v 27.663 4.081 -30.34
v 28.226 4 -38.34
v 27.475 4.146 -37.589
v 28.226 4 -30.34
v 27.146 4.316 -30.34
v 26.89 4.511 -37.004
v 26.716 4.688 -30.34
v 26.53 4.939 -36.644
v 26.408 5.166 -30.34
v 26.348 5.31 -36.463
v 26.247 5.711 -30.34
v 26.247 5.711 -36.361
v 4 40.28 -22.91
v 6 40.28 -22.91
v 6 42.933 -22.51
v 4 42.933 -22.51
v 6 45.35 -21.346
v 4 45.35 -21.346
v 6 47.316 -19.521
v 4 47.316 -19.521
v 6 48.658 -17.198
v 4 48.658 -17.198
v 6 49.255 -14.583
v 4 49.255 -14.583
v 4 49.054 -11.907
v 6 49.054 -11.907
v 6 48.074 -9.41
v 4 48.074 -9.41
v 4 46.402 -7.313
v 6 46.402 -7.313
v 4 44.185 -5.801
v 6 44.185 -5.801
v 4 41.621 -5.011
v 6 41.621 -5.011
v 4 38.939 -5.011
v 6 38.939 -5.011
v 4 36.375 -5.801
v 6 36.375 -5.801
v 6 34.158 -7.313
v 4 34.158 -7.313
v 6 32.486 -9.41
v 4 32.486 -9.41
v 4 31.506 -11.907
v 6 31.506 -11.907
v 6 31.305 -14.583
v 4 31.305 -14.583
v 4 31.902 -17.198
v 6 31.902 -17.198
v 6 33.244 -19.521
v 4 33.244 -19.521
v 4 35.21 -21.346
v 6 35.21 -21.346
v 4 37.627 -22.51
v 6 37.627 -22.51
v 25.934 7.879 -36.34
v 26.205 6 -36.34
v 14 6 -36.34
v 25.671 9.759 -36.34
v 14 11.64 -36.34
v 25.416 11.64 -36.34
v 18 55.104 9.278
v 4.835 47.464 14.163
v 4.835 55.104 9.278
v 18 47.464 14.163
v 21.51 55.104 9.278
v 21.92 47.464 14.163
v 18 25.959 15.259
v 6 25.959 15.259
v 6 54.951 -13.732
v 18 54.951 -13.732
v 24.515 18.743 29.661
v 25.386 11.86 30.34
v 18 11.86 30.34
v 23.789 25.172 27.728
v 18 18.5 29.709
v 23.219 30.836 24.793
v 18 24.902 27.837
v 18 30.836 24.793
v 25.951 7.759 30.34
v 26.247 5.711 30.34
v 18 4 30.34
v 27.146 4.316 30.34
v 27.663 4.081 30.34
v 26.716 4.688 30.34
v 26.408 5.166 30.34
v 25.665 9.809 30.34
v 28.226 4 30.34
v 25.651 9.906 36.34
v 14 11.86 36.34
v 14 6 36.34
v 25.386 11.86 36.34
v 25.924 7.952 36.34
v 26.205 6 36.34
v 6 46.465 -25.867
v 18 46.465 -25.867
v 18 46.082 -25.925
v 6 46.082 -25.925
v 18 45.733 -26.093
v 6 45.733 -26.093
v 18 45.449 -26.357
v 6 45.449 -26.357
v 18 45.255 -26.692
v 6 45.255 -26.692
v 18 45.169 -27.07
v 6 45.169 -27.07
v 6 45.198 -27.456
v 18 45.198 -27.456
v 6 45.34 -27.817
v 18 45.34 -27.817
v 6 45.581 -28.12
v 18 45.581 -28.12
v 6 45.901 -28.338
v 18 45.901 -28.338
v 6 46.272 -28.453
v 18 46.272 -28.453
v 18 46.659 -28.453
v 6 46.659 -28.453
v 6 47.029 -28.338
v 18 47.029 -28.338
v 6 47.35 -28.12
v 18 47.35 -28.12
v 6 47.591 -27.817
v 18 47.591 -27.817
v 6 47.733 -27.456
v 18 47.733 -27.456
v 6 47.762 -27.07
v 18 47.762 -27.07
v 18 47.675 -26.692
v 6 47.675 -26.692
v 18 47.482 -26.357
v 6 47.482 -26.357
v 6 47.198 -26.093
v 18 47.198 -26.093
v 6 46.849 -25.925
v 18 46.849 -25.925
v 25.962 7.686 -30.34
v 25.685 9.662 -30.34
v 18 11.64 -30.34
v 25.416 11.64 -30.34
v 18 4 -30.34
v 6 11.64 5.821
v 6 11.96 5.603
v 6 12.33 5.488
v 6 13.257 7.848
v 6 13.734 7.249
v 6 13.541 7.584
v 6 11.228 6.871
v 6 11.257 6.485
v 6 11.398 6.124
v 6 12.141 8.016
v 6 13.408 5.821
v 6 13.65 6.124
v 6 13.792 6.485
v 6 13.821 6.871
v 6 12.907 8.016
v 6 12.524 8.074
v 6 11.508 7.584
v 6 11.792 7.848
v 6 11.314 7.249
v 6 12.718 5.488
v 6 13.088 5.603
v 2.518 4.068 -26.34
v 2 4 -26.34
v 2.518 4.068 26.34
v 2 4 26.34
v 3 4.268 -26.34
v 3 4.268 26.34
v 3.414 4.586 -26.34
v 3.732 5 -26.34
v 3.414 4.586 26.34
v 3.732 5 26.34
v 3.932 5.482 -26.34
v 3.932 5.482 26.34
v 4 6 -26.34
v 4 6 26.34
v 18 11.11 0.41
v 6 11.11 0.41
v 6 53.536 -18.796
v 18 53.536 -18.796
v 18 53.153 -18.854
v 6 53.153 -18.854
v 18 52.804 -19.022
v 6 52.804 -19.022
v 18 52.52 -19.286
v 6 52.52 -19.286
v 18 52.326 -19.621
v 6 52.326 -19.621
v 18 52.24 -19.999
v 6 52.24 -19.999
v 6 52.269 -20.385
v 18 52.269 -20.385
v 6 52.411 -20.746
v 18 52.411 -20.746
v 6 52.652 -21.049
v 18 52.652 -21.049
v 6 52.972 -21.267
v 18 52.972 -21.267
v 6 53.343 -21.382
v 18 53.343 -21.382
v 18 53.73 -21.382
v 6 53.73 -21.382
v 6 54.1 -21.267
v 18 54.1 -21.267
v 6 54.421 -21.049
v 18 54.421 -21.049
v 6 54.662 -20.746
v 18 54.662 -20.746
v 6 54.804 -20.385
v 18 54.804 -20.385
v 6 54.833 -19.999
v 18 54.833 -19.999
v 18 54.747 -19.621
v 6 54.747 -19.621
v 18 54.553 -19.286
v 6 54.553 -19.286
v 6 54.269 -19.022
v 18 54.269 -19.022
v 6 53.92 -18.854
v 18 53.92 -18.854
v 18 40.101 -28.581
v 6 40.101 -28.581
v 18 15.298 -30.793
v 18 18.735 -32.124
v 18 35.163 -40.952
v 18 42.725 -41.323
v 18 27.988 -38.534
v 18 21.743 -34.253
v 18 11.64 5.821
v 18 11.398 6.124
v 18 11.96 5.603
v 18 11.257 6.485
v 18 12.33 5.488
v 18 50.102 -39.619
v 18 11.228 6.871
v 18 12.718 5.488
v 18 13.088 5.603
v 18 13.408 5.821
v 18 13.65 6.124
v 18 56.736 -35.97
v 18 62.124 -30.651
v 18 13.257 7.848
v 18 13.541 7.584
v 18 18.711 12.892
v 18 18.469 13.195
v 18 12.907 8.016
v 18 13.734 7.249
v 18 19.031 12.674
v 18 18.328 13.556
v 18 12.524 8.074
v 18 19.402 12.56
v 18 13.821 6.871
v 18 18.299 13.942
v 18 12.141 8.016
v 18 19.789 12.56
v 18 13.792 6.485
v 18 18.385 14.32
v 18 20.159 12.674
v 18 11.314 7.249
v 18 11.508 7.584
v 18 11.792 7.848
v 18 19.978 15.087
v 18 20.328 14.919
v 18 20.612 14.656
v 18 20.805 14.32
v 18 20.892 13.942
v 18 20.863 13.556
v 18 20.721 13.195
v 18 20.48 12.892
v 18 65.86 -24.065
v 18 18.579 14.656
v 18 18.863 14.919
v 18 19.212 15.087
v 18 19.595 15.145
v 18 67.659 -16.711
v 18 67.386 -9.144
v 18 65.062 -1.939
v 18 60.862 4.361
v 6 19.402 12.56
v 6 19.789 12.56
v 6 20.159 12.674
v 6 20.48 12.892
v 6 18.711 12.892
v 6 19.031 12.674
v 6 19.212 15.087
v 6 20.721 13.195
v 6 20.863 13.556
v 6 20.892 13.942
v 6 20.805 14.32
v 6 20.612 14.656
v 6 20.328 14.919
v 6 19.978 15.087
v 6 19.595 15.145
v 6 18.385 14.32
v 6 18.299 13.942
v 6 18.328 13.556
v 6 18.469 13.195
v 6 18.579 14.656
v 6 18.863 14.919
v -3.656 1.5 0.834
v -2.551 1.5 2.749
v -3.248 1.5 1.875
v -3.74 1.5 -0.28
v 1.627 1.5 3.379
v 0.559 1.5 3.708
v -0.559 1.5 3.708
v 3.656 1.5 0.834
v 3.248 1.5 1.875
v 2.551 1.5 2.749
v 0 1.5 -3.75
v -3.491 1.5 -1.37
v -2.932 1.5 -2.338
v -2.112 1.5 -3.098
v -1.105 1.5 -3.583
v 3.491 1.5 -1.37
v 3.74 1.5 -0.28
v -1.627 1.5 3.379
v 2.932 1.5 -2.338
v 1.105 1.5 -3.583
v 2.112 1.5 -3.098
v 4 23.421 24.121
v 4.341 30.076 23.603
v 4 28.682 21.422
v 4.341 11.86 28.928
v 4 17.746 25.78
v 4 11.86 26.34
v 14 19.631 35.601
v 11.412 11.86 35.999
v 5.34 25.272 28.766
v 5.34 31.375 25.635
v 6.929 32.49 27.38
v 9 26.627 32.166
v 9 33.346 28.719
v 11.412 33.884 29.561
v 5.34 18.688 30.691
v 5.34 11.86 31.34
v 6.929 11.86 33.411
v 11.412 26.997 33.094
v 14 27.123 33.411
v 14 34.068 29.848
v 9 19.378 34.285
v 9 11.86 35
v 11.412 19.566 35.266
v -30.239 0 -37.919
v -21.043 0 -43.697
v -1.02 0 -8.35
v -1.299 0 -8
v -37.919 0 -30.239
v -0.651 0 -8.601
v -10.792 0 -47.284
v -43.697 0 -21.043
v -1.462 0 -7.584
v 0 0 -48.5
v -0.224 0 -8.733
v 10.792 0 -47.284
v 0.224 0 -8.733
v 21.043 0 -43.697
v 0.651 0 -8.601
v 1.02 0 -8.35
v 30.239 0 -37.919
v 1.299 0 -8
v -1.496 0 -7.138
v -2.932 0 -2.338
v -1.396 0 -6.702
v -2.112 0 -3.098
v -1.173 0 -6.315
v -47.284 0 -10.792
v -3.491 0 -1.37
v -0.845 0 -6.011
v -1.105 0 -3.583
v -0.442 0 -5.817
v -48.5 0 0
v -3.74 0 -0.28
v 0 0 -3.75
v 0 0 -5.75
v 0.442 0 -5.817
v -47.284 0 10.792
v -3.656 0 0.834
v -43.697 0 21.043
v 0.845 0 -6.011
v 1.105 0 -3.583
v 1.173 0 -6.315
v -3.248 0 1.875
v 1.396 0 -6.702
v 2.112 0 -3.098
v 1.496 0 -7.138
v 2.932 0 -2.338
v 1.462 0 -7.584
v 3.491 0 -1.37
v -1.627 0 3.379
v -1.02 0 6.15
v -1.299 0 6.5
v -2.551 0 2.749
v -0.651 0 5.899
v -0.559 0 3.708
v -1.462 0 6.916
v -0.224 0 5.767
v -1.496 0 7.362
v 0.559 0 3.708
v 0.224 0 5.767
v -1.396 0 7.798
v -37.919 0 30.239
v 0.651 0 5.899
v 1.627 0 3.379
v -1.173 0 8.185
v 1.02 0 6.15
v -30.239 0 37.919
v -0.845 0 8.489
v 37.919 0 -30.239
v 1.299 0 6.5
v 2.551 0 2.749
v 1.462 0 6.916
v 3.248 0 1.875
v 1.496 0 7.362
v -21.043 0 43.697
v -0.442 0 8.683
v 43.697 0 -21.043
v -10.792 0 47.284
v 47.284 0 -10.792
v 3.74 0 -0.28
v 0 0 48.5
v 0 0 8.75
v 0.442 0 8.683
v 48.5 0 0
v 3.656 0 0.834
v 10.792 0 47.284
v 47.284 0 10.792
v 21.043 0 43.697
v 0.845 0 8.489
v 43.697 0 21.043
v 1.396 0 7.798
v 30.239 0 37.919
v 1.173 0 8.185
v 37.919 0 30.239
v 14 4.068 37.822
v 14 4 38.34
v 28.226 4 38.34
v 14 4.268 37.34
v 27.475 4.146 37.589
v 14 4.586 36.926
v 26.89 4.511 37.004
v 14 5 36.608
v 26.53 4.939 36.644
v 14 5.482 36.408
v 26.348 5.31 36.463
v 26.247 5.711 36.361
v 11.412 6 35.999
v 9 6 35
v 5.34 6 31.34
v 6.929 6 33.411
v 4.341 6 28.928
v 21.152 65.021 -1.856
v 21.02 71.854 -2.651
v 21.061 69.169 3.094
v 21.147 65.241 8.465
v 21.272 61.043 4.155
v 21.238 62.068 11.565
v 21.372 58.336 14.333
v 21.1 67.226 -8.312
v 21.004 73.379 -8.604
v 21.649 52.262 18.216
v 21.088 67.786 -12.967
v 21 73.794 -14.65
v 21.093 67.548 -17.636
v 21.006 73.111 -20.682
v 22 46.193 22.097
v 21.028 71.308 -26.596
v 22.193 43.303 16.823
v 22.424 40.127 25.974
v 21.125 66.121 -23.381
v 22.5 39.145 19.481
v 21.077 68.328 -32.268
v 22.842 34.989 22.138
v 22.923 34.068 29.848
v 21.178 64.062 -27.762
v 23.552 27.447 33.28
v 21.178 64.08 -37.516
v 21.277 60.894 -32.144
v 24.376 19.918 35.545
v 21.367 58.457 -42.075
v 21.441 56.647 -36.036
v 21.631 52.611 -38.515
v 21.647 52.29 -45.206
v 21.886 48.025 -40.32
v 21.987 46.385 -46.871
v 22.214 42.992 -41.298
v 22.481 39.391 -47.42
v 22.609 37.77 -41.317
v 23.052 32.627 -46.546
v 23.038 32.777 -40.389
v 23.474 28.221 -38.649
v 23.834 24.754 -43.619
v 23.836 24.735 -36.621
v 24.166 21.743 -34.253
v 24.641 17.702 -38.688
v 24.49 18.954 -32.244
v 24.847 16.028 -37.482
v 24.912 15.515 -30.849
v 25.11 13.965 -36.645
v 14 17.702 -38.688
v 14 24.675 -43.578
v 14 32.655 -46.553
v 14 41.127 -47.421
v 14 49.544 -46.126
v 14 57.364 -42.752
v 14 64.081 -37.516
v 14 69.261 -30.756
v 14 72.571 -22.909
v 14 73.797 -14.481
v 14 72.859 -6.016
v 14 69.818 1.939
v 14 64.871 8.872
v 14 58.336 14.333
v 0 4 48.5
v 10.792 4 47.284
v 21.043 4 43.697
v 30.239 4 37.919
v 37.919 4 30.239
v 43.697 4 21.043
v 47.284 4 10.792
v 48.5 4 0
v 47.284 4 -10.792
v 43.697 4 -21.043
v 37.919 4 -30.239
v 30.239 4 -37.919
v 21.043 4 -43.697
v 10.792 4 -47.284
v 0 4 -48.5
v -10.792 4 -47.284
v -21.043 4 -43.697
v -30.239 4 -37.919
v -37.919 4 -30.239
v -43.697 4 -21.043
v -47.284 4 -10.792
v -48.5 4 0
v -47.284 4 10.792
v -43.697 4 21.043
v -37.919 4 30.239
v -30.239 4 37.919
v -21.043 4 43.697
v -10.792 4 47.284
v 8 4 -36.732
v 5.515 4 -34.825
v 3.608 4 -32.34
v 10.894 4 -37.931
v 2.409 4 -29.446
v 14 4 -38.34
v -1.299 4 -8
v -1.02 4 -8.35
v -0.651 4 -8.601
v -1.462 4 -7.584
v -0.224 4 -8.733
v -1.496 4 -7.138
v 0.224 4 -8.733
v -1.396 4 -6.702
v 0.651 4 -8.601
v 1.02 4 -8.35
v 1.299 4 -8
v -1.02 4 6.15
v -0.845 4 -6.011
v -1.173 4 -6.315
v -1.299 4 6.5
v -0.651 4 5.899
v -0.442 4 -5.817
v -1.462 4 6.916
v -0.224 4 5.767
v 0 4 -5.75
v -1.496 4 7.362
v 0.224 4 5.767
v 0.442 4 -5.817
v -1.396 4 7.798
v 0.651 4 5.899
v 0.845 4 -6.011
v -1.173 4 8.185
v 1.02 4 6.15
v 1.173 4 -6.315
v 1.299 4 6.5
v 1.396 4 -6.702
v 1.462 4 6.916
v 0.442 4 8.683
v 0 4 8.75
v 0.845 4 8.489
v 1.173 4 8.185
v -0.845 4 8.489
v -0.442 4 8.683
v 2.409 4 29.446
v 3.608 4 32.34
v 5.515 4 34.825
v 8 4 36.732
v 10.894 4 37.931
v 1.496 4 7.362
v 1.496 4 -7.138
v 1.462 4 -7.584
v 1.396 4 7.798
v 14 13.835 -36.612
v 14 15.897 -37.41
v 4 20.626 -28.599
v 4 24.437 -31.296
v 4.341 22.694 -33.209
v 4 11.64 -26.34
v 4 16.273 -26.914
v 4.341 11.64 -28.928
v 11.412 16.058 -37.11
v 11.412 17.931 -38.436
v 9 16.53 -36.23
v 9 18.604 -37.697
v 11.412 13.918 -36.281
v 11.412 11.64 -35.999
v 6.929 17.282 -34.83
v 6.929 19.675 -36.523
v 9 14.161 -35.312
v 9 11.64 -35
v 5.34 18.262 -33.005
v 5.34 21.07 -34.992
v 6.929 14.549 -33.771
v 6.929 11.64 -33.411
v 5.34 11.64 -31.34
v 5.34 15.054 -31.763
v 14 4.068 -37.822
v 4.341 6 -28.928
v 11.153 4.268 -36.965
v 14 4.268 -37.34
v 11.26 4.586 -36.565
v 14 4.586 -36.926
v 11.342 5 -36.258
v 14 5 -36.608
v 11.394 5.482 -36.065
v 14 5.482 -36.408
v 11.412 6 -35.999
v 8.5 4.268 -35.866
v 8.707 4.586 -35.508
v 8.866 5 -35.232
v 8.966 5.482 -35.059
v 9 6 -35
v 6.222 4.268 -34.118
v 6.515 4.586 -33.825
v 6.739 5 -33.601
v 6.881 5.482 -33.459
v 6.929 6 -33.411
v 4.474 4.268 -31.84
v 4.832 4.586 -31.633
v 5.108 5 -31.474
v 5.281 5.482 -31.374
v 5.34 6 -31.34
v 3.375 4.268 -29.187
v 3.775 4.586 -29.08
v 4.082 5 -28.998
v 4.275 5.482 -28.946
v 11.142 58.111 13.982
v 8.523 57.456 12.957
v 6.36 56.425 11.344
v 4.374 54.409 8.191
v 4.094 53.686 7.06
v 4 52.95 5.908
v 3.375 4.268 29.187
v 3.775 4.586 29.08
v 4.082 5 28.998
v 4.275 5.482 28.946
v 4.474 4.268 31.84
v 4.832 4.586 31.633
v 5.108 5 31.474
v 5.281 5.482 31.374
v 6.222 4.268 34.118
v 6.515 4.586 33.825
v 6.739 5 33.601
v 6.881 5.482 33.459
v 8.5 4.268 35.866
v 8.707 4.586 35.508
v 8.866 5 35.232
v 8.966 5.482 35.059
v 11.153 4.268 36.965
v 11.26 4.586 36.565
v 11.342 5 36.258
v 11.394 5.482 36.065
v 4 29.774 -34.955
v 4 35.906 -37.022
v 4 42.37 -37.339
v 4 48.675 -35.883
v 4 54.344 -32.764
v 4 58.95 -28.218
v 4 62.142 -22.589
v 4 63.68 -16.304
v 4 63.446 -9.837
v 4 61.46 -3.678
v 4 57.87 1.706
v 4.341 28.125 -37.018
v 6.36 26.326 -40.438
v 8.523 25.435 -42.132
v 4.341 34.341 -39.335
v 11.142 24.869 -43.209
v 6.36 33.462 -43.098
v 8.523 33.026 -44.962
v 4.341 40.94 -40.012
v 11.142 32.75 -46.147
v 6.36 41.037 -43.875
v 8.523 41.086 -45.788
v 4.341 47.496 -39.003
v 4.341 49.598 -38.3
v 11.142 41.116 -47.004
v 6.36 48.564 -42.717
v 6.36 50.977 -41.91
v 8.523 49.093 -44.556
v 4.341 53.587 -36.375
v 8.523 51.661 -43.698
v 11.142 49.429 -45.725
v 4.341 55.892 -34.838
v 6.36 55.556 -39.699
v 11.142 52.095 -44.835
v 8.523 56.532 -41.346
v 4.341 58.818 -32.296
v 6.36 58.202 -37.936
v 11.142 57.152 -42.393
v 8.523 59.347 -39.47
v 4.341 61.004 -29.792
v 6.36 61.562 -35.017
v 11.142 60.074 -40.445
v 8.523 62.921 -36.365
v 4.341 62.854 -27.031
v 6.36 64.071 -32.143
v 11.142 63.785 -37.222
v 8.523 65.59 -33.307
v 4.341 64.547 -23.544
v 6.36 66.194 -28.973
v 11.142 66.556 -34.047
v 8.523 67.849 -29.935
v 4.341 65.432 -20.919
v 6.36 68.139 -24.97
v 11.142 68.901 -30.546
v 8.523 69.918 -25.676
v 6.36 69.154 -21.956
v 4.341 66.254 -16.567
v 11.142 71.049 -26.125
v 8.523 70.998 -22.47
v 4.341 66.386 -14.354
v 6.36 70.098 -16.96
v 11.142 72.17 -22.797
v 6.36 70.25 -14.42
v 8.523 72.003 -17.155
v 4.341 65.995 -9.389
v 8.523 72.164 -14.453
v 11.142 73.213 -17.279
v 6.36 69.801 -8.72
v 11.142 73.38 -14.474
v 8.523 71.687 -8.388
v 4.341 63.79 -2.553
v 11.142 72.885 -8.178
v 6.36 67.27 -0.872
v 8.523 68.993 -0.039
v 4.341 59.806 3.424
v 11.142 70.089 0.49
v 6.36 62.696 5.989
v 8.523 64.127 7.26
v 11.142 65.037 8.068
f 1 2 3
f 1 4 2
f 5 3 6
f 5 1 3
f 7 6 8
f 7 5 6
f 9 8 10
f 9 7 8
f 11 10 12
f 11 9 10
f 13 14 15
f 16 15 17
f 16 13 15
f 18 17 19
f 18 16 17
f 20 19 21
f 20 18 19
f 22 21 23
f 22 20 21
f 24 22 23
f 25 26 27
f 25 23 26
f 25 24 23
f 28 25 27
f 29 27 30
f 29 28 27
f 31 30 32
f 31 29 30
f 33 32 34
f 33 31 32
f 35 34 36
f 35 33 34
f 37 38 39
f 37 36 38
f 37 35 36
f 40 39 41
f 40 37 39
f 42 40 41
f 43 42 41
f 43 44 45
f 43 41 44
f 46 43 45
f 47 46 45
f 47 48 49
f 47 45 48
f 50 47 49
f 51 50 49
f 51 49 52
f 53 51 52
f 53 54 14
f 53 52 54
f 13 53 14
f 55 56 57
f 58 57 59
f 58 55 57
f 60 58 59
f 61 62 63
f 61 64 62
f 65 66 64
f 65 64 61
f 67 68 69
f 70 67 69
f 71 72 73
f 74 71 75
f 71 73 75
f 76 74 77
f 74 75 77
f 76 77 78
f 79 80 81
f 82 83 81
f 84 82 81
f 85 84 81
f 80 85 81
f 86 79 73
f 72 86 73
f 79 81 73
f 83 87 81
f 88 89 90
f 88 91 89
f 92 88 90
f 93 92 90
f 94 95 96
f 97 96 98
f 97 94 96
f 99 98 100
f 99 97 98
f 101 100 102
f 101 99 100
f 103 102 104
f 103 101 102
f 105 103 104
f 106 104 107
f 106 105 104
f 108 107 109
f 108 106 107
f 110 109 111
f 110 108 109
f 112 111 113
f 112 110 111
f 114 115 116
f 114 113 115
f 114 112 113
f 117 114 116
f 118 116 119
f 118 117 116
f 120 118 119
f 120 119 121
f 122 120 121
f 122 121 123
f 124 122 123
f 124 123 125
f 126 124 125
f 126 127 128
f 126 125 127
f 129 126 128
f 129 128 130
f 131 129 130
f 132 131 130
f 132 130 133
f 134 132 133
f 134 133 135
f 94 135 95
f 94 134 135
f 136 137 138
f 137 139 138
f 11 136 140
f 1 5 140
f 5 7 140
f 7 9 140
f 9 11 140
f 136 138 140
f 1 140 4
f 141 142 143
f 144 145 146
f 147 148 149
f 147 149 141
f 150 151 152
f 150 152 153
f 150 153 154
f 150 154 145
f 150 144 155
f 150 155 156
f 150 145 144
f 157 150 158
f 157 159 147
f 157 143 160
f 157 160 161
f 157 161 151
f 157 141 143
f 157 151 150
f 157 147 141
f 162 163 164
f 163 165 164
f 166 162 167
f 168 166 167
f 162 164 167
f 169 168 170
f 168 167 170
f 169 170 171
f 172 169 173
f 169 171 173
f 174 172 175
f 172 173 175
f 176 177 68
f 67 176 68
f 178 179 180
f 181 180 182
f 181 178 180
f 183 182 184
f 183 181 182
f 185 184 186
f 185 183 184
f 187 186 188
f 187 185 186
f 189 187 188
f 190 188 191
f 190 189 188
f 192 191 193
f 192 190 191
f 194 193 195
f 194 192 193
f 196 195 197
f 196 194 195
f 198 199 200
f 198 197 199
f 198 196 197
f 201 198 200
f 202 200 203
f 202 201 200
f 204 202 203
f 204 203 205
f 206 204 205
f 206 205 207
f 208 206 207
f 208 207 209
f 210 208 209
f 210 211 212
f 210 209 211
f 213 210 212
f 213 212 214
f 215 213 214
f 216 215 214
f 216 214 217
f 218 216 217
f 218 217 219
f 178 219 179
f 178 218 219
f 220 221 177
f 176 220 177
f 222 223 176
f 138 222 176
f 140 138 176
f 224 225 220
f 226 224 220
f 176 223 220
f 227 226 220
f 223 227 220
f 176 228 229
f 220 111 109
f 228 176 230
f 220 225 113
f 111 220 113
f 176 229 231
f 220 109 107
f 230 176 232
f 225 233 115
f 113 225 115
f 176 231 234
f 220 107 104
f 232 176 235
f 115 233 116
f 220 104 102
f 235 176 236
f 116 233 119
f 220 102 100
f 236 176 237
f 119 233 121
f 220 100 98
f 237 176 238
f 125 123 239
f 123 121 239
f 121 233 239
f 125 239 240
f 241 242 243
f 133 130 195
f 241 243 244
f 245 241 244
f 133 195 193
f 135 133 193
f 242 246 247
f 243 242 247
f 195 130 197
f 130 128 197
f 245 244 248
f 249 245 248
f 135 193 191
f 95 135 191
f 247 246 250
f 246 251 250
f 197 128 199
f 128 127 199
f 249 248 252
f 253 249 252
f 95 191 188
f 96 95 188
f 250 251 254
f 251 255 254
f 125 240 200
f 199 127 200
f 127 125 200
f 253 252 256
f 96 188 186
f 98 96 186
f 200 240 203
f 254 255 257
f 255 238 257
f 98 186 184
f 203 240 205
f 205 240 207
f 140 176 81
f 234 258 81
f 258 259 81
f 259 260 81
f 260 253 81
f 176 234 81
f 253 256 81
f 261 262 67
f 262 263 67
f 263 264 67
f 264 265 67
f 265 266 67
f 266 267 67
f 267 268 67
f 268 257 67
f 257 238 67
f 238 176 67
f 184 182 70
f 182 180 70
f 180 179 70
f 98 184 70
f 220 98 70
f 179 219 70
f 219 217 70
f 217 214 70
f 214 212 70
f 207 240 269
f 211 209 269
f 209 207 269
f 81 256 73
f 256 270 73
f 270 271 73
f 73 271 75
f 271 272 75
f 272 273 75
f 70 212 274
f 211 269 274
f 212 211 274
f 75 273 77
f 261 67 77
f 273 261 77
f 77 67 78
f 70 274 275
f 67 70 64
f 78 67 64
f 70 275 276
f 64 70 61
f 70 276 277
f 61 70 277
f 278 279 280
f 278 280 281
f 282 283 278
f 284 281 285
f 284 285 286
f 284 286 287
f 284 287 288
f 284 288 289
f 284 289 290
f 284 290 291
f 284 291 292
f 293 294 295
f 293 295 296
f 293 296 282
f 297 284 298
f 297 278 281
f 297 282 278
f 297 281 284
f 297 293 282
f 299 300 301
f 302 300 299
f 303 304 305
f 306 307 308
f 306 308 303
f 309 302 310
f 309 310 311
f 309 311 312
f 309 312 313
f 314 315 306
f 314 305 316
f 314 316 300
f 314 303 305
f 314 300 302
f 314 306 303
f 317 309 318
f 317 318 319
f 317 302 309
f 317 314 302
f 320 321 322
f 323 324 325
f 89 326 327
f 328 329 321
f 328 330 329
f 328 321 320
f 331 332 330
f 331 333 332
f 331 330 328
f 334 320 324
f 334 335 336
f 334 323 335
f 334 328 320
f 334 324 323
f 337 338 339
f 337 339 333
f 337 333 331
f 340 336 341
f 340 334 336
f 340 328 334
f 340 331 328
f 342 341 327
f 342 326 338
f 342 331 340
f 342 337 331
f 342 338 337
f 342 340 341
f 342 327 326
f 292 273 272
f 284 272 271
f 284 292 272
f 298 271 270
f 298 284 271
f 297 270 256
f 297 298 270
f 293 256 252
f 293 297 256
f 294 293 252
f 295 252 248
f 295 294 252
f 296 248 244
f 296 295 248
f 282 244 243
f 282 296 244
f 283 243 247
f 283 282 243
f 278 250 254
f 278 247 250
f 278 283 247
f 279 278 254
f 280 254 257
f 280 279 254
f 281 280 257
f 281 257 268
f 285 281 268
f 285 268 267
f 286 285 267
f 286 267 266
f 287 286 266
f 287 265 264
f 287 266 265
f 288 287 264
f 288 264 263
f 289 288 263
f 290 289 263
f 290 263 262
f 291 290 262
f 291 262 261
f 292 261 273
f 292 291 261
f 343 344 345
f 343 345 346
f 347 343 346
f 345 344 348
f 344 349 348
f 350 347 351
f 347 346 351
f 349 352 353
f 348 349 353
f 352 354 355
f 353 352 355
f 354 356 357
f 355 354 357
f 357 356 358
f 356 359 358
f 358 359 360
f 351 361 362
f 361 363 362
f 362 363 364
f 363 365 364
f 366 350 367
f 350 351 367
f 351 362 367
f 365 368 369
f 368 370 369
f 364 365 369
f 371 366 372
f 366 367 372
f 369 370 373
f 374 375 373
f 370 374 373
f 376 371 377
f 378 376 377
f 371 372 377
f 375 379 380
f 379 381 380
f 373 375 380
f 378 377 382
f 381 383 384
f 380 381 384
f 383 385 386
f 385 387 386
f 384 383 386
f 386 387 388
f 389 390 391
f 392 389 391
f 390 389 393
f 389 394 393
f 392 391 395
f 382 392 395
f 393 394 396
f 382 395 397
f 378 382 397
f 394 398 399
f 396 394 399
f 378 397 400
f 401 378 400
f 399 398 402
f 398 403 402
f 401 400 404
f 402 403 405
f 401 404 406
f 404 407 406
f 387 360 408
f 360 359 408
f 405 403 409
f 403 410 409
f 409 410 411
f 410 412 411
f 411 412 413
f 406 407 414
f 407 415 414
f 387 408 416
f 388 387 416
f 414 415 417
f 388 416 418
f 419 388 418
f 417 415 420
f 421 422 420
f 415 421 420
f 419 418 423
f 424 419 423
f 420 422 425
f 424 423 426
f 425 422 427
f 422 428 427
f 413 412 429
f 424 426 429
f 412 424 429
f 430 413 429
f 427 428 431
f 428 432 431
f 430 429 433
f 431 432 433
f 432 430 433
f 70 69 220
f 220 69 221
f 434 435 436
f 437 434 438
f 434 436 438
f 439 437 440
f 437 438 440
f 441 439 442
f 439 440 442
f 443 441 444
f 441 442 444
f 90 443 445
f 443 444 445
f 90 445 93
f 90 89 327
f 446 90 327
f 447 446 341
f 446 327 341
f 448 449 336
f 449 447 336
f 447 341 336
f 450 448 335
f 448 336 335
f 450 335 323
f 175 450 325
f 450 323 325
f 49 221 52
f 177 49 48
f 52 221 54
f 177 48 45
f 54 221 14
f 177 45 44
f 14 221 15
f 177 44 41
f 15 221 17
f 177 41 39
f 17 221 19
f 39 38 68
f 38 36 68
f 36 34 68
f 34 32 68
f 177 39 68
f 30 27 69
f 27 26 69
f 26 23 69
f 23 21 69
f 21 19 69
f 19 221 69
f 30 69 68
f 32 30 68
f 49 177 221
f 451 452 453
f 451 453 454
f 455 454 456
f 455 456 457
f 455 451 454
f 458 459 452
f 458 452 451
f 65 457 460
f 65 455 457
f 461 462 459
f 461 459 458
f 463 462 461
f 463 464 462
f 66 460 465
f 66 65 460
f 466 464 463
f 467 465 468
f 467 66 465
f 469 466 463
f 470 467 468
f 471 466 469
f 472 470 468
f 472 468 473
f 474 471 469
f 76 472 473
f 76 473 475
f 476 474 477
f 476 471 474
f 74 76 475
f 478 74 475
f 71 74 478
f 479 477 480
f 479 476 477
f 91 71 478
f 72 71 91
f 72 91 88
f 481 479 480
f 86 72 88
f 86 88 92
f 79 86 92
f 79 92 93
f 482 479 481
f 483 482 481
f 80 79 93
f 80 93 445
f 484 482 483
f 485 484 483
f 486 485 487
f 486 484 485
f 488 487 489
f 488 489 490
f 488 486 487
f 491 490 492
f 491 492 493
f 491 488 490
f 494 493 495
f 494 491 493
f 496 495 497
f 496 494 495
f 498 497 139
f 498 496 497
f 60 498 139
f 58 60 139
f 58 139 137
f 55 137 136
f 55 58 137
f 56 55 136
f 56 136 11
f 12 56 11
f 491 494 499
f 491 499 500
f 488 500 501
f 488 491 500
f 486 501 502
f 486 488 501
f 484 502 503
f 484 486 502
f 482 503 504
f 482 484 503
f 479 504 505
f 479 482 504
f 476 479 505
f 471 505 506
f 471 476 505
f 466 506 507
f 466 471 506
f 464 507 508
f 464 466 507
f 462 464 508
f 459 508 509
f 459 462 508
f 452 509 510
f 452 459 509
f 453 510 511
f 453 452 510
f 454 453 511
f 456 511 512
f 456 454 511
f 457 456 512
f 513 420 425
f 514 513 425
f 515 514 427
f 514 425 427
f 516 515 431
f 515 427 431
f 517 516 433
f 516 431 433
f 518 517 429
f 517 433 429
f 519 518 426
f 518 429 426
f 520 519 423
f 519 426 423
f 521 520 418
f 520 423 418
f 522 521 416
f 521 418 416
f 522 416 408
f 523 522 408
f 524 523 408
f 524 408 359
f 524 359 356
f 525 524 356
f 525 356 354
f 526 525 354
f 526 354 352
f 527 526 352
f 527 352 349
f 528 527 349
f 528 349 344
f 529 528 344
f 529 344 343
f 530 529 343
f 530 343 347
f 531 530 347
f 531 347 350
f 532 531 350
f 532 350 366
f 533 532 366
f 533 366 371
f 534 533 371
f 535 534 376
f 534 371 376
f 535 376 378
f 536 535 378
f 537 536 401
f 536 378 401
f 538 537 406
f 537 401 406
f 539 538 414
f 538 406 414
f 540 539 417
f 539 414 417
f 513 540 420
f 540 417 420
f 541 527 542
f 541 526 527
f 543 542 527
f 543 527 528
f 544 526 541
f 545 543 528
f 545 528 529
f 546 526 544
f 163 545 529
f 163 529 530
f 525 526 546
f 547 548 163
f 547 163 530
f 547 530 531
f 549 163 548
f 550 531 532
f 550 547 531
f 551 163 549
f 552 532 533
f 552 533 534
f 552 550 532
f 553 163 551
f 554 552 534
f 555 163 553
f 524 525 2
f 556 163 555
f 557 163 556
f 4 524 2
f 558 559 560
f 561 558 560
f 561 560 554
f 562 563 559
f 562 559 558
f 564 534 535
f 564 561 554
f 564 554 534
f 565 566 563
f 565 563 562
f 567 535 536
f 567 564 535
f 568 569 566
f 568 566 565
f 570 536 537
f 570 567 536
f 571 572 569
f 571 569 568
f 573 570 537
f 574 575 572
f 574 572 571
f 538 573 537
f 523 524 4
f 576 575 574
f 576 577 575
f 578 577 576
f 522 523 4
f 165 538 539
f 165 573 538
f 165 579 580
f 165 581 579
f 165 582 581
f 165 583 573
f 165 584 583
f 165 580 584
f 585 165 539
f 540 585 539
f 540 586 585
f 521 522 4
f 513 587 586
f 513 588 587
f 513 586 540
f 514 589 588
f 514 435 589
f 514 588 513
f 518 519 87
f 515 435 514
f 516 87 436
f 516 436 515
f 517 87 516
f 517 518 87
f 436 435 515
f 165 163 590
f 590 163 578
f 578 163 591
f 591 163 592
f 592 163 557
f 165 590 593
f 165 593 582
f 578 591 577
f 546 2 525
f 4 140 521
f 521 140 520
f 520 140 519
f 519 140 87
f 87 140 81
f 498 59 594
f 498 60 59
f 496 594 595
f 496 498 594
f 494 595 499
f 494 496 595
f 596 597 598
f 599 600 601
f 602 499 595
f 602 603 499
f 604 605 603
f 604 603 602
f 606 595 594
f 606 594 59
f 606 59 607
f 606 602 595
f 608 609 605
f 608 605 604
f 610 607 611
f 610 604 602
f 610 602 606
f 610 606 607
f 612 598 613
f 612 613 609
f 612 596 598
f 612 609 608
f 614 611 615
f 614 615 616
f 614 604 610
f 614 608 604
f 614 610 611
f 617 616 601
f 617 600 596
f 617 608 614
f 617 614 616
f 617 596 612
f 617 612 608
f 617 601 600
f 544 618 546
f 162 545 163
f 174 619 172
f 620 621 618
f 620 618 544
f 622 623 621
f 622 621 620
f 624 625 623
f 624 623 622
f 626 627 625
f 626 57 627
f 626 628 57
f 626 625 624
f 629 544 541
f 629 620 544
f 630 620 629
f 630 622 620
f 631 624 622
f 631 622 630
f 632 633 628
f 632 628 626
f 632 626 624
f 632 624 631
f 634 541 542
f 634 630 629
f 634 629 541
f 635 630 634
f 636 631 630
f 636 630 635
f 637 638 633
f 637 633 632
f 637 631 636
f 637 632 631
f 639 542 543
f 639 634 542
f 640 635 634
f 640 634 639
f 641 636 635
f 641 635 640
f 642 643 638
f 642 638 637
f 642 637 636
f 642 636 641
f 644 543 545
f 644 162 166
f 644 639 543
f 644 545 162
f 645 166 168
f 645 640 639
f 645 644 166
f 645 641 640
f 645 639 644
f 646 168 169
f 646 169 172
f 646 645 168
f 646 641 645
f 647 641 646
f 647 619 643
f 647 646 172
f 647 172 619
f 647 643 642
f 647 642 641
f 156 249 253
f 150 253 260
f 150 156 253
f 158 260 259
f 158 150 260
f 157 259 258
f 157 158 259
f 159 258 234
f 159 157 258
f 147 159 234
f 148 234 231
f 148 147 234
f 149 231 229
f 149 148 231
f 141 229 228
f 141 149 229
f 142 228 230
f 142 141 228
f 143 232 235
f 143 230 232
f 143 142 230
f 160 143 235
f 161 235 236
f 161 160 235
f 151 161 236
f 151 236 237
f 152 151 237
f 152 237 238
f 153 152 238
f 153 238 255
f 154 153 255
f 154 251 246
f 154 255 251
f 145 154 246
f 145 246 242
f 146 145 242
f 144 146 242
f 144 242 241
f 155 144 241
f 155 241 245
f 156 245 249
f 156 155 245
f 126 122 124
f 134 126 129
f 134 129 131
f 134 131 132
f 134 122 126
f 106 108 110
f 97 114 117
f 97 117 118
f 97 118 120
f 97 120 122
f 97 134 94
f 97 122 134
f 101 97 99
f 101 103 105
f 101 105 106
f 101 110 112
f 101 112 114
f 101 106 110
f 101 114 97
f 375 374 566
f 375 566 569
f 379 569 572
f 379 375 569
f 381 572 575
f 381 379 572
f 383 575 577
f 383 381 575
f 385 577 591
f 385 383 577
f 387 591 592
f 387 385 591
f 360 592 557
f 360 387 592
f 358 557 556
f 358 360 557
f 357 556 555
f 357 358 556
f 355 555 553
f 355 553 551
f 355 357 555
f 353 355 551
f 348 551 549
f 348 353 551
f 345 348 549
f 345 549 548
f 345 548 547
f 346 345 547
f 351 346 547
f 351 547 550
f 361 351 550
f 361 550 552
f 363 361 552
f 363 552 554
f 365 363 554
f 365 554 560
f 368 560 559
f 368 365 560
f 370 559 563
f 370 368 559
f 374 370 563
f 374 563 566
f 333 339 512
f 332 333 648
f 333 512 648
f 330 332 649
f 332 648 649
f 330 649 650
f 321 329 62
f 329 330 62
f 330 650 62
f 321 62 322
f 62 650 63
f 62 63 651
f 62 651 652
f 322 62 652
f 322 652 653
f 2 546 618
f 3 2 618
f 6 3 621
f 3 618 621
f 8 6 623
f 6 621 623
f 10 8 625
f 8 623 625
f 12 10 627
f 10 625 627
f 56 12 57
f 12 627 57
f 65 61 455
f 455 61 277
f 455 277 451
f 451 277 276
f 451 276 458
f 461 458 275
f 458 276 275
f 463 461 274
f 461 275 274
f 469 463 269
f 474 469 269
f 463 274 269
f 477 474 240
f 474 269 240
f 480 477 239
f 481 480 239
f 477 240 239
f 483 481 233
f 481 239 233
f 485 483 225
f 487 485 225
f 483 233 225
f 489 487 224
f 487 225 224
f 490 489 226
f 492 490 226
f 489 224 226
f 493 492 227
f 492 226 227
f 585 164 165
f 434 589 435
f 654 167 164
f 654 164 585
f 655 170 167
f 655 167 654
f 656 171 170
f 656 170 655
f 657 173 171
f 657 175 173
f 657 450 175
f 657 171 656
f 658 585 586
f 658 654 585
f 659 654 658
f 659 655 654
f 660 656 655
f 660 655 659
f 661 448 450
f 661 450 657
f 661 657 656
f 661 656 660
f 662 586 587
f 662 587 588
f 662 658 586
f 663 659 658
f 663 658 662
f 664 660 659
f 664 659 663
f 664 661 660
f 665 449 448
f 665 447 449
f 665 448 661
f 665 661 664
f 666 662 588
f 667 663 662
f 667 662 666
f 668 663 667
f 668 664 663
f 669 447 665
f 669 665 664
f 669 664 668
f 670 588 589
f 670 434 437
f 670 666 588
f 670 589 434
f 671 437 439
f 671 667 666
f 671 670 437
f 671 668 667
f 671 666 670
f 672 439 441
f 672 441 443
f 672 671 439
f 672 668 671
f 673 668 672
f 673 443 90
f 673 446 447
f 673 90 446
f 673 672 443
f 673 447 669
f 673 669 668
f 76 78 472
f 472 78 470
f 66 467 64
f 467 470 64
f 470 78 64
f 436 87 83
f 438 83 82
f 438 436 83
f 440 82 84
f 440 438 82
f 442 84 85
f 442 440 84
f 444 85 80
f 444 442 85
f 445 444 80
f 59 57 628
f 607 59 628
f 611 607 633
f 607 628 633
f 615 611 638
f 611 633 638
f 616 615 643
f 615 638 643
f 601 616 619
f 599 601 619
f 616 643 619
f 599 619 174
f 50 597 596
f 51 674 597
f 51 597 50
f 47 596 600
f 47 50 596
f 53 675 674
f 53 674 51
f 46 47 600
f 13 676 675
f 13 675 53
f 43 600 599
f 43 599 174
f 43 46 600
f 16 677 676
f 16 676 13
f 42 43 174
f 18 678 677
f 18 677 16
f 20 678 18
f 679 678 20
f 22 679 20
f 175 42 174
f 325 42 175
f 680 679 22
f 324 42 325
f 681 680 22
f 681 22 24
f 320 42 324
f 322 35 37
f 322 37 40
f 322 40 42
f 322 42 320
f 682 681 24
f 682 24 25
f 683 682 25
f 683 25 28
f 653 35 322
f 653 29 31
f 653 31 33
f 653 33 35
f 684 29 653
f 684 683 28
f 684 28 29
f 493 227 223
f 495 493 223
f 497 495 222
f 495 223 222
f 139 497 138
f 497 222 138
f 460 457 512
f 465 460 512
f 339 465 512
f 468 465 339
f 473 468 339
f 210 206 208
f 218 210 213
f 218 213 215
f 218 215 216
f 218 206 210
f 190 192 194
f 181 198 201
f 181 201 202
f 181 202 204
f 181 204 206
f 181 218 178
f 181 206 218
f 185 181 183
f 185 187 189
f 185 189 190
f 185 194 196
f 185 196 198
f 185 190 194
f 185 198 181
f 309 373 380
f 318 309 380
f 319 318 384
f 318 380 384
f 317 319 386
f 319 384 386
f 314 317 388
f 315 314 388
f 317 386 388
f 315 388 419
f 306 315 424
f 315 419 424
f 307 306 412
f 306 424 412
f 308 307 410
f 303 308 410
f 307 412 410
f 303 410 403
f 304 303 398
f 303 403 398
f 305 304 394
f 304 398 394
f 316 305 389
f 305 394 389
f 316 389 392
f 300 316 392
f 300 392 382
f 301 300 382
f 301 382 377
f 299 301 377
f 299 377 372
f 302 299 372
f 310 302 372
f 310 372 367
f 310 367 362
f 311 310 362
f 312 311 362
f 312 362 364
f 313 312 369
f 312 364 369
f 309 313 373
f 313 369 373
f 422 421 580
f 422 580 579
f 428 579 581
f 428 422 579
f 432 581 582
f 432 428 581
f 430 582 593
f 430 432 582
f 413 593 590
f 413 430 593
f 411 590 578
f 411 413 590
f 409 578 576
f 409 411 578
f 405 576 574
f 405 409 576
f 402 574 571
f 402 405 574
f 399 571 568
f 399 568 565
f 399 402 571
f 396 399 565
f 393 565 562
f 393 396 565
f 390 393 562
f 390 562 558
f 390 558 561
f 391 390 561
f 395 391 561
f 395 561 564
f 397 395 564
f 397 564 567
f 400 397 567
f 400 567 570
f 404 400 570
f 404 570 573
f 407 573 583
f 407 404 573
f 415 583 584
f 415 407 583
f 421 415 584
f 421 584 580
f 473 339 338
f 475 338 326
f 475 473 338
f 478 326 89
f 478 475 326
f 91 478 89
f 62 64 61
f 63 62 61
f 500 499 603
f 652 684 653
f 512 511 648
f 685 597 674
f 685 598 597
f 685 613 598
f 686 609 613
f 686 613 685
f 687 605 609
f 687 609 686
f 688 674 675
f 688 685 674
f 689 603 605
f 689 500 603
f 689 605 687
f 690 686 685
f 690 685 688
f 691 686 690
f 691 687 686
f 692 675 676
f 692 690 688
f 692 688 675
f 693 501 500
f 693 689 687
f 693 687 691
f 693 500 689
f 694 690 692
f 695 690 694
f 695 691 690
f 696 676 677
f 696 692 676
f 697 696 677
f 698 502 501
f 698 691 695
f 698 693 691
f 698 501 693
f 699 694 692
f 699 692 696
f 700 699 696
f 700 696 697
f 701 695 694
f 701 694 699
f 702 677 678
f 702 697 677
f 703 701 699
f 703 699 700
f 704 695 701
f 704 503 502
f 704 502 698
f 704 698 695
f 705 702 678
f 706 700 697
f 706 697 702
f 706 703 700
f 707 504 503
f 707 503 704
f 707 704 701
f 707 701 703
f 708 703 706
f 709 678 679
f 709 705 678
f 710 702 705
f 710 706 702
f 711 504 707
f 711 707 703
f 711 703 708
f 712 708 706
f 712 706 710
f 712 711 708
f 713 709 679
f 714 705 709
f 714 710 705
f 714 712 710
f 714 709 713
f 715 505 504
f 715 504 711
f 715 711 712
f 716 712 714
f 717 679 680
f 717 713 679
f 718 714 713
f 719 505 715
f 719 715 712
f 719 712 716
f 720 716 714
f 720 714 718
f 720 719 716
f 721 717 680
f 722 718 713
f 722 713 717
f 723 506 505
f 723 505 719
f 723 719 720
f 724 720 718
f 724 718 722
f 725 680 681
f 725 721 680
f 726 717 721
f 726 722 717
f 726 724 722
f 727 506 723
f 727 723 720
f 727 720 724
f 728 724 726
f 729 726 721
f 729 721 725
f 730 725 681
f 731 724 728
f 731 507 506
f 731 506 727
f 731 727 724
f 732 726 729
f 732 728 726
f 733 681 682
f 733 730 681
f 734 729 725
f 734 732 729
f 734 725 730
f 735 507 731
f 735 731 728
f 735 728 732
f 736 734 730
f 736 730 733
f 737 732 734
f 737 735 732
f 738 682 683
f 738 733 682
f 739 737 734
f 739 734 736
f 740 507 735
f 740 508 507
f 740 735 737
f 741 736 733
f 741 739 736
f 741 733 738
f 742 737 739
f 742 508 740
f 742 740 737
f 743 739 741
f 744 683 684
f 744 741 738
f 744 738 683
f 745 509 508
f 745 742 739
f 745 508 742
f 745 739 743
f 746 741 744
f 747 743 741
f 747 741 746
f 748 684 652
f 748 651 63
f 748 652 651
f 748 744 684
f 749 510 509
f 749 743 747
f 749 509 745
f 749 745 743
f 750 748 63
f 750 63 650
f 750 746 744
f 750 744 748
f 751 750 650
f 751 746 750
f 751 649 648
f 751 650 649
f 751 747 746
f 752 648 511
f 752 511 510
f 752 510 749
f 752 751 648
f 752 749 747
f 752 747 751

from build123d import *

# Parameters (mm, degrees)
SKETCH1_R                       = 48.5
SKETCH1_R_2                     = 1.5
BOSS_EXTRUDE1_DEPTH             = 4
SKETCH2_R                       = 3.75
CUT_EXTRUDE1_DEPTH              = 1.5
BOSS_EXTRUDE2_START             = 4
SKETCH3_R                       = 9
BOSS_EXTRUDE2_DEPTH             = 14
CUT_EXTRUDE3_START              = 6
SKETCH4_R                       = 1.3
CUT_EXTRUDE3_DEPTH              = 91.444646155
BOSS_EXTRUDE3_DEPTH             = 9
BOSS_EXTRUDE3_DIRECTION_2_REACH = 108.638
CUT_EXTRUDE4_DEPTH              = 101.75311462
CUT_EXTRUDE4_DEPTH_BACK         = 101.75311462
FILLET1_R                       = 10
FILLET2_R                       = 2


with BuildPart() as part:
    # Sketch1 → Boss-Extrude1 (new body)
    with BuildSketch(Plane(origin=(0, 0, 0), x_dir=(1, 0, 0), z_dir=(0, 1, 0))):
        with Locations(Location((0, 0, 0), (0, 0, 270))):
            Circle(SKETCH1_R)
        with Locations(Location((0, 7.25, 0), (0, 0, 270))):
            Circle(SKETCH1_R_2, mode=Mode.SUBTRACT)
        with Locations(Location((0, -7.25, 0), (0, 0, 270))):
            Circle(SKETCH1_R_2, mode=Mode.SUBTRACT)
    extrude(amount=BOSS_EXTRUDE1_DEPTH)

    # Sketch2 → Cut-Extrude1 (cut)
    with BuildSketch(Plane.XZ):
        with Locations(Location((0, 0, 0), (0, 0, 270))):
            Circle(SKETCH2_R)
    extrude(amount=-CUT_EXTRUDE1_DEPTH, mode=Mode.SUBTRACT)

    # Sketch3 → Boss-Extrude2 (add)
    with BuildSketch(Plane(origin=(0, 0, 0), x_dir=(0, 0, -1), z_dir=(1, 0, 0)).offset(BOSS_EXTRUDE2_START)):
        with BuildLine():
            Line((30.34, 4), (-30.34, 4))
            Line((-30.34, 4), (-30.34, 11.86))
            ThreePointArc((-30.34, 11.86), (-28.924736696, 21.745164753), (-24.792654999, 30.836113728))
            Line((-24.792654999, 30.836113728), (-9.278105641, 55.104149989))
            ThreePointArc((-9.278105641, 55.104149989), (30.651097233, 62.12443475), (34.252718415, 21.743078098))
            ThreePointArc((34.252718415, 21.743078098), (31.352340729, 17.057138369), (30.34, 11.64))
            Line((30.34, 11.64), (30.34, 4))
        make_face()
        with Locations((13.91, 40.28)):
            Circle(SKETCH3_R, mode=Mode.SUBTRACT)
    extrude(amount=BOSS_EXTRUDE2_DEPTH)

    # Sketch4 → Cut-Extrude3 (cut, through all)
    with BuildSketch(Plane(origin=(0, 0, 0), x_dir=(0, 0, -1), z_dir=(1, 0, 0)).offset(CUT_EXTRUDE3_START)):
        Polygon((-15.259242405, 25.959242405), (13.732135624, 54.950620434), (28.581378029, 40.101378029), (-0.41, 11.11), align=None)
        with Locations(Location((-13.845028843, 19.595281374, 0), (0, 0, 180))):
            Circle(SKETCH4_R)
        with Locations(Location((-6.773961031, 12.524213562, 0), (0, 0, 180))):
            Circle(SKETCH4_R)
        with Locations(Location((20.096096654, 53.536406871, 0), (0, 0, 180))):
            Circle(SKETCH4_R)
        with Locations(Location((27.167164466, 46.465339059, 0), (0, 0, 180))):
            Circle(SKETCH4_R)
    extrude(amount=CUT_EXTRUDE3_DEPTH, mode=Mode.SUBTRACT)

    # Sketch5 → Boss-Extrude3 (add)
    with BuildSketch(Plane(origin=(18, 0, 0), x_dir=(0, 0, -1), z_dir=(1, 0, 0))):
        with BuildLine():
            Line((30.34, 4), (36.34, 4))
            Line((36.34, 4), (36.34, 11.64))
            ThreePointArc((36.34, 11.64), (36.947404437, 14.890283021), (38.687631049, 17.701846859))
            ThreePointArc((38.687631049, 17.701846859), (34.300821036, 66.886736311), (-14.333340667, 58.335960445))
            Line((-14.333340667, 58.335960445), (-29.847890025, 34.067924184))
            ThreePointArc((-29.847890025, 34.067924184), (-34.683704058, 23.428701186), (-36.34, 11.86))
            Line((-36.34, 11.86), (-36.34, 4))
            Line((-36.34, 4), (-30.34, 4))
            Line((-30.34, 4), (-30.34, 11.86))
            ThreePointArc((-30.34, 11.86), (-28.924736696, 21.745164753), (-24.792654999, 30.836113728))
            Line((-24.792654999, 30.836113728), (-14.162524076, 47.463886585))
            ThreePointArc((-14.162524076, 47.463886585), (-11.806963139, 51.339412511), (-9.278105641, 55.104149989))
            ThreePointArc((-9.278105641, 55.104149989), (30.651097233, 62.12443475), (34.252718415, 21.743078098))
            ThreePointArc((34.252718415, 21.743078098), (31.352340729, 17.057138369), (30.34, 11.64))
            Line((30.34, 11.64), (30.34, 4))
        make_face()
    extrude(amount=BOSS_EXTRUDE3_DEPTH)

    # Boss-Extrude3 direction 2: up to this face of the body (flat: up to its plane)
    boss_extrude3_direction_2_end = Plane(part.part.faces().sort_by_distance((4, 32.000889593, -6.762869766))[0])
    # Sketch5 → Boss-Extrude3 direction 2 (add, up to the picked face)
    with BuildSketch(Plane(origin=(18, 0, 0), x_dir=(0, 0, -1), z_dir=(1, 0, 0)), mode=Mode.PRIVATE) as boss_extrude3_direction_2_sk1:
        with BuildLine():
            Line((30.34, 4), (36.34, 4))
            Line((36.34, 4), (36.34, 11.64))
            ThreePointArc((36.34, 11.64), (36.947404437, 14.890283021), (38.687631049, 17.701846859))
            ThreePointArc((38.687631049, 17.701846859), (34.300821036, 66.886736311), (-14.333340667, 58.335960445))
            Line((-14.333340667, 58.335960445), (-29.847890025, 34.067924184))
            ThreePointArc((-29.847890025, 34.067924184), (-34.683704058, 23.428701186), (-36.34, 11.86))
            Line((-36.34, 11.86), (-36.34, 4))
            Line((-36.34, 4), (-30.34, 4))
            Line((-30.34, 4), (-30.34, 11.86))
            ThreePointArc((-30.34, 11.86), (-28.924736696, 21.745164753), (-24.792654999, 30.836113728))
            Line((-24.792654999, 30.836113728), (-14.162524076, 47.463886585))
            ThreePointArc((-14.162524076, 47.463886585), (-11.806963139, 51.339412511), (-9.278105641, 55.104149989))
            ThreePointArc((-9.278105641, 55.104149989), (30.651097233, 62.12443475), (34.252718415, 21.743078098))
            ThreePointArc((34.252718415, 21.743078098), (31.352340729, 17.057138369), (30.34, 11.64))
            Line((30.34, 11.64), (30.34, 4))
        make_face()
    boss_extrude3_direction_2_tool1 = split(extrude(boss_extrude3_direction_2_sk1.sketch, amount=-BOSS_EXTRUDE3_DIRECTION_2_REACH, mode=Mode.PRIVATE), bisect_by=boss_extrude3_direction_2_end, keep=Keep.BOTH, mode=Mode.PRIVATE)
    add(boss_extrude3_direction_2_tool1.solids().sort_by(Axis((18, 7.82, -31.430412), (-1, 0, 0)))[0])

    # Sketch6 → Cut-Extrude4 (cut, two sides: drawn at the far end of the back side and taken through both)
    with BuildSketch(Plane.XY.offset(-CUT_EXTRUDE4_DEPTH_BACK)):
        with BuildLine():
            Line((27, 73.801694463), (21, 73.801694463))
            ThreePointArc((21, 73.801694463), (22.52665425, 38.804454133), (26.5, 4))
            Line((26.5, 4), (27, 4))
            Line((27, 4), (27, 73.801694463))
        make_face()
    extrude(amount=CUT_EXTRUDE4_DEPTH + CUT_EXTRUDE4_DEPTH_BACK, mode=Mode.SUBTRACT)

    # Fillet1
    # the kernel refuses this fillet: 10 mm, written as the material it takes off along each edge
    with BuildSketch(Plane(origin=(4, 11.86, 36.34), x_dir=(0, 0, -1), z_dir=(0, -1, 0))) as fillet1_piece_1:
        with BuildLine():
            CenterArc((FILLET1_R, FILLET1_R), FILLET1_R, 180, 90)
            Line((0, FILLET1_R), (0, 0))
            Line((0, 0), (FILLET1_R, 0))
        make_face()
    extrude(amount=7.86, mode=Mode.SUBTRACT)
    with BuildSketch(Plane(origin=(4, 11.86, -4.89), x_dir=(0, 0.5386350760234976, 0.8425391711233141), z_dir=(0, 0.8425391711233141, -0.5386350760234976))) as fillet1_piece_2:
        with BuildLine():
            CenterArc((41.23 - FILLET1_R, FILLET1_R), FILLET1_R, 270, 90)
            Line((41.23, FILLET1_R), (41.23, 0))
            Line((41.23, 0), (41.23 - FILLET1_R, 0))
        make_face()
    revolve(axis=Axis((4, 11.86, -4.89), (1, 0, 0)), revolution_arc=32.590770812, mode=Mode.SUBTRACT)
    with BuildSketch(Plane(origin=(4, 58.335960445, 14.333340667), x_dir=(0, -0.5386350760234987, -0.8425391711233132), z_dir=(0, -0.8425391711233133, 0.5386350760234988))) as fillet1_piece_3:
        with BuildLine():
            CenterArc((FILLET1_R, FILLET1_R), FILLET1_R, 180, 90)
            Line((0, FILLET1_R), (0, 0))
            Line((0, 0), (FILLET1_R, 0))
        make_face()
    extrude(amount=28.803451629, mode=Mode.SUBTRACT)
    with BuildSketch(Plane(origin=(4, 40.28, -13.91), x_dir=(0, -0.6735385398377844, -0.7391521056948869), z_dir=(0, -0.7391521056948869, 0.6735385398377844))) as fillet1_piece_4:
        with BuildLine():
            CenterArc((33.521694463 - FILLET1_R, FILLET1_R), FILLET1_R, 270, 90)
            Line((33.521694463, FILLET1_R), (33.521694463, 0))
            Line((33.521694463, 0), (33.521694463 - FILLET1_R, 0))
        make_face()
    revolve(axis=Axis((4, 40.28, -13.91), (1, 0, 0)), revolution_arc=189.749991197, mode=Mode.SUBTRACT)
    with BuildSketch(Plane(origin=(4, 4, -36.34), x_dir=(0, 0, 1), z_dir=(0, 1, 0))) as fillet1_piece_5:
        with BuildLine():
            CenterArc((FILLET1_R, FILLET1_R), FILLET1_R, 180, 90)
            Line((0, FILLET1_R), (0, 0))
            Line((0, 0), (FILLET1_R, 0))
        make_face()
    extrude(amount=7.64, mode=Mode.SUBTRACT)
    with BuildSketch(Plane(origin=(4, 11.64, -45.34), x_dir=(0, 0.6735385398377856, 0.7391521056948859), z_dir=(0, 0.7391521056948859, -0.6735385398377856))) as fillet1_piece_6:
        with BuildLine():
            CenterArc((9 + FILLET1_R, FILLET1_R), FILLET1_R, 180, 90)
            Line((9, FILLET1_R), (9, 0))
            Line((9, 0), (9 + FILLET1_R, 0))
        make_face()
    revolve(axis=Axis((4, 11.64, -45.34), (1, 0, 0)), revolution_arc=42.340762009, mode=Mode.SUBTRACT)

    # Fillet2
    fillet2_edges = [part.edges().sort_by_distance(p)[0] for p in [
        (20.25, 4, -36.34),
        (20.25, 4, 36.34),
        (6.928932188, 4, 33.411067812),
        (4, 4, 0),
        (6.928932188, 4, -33.411067812),
    ]]
    fillet(fillet2_edges, radius=FILLET2_R)
    fillet2_2_edges = [part.edges().sort_by_distance(p)[0] for p in [
        (26.5, 4, -33.34),
    ]]
    fillet(fillet2_2_edges, radius=FILLET2_R)
    fillet2_3_edges = [part.edges().sort_by_distance(p)[0] for p in [
        (26.5, 4, 33.34),
    ]]
    fillet(fillet2_3_edges, radius=FILLET2_R)


solid = part.part
